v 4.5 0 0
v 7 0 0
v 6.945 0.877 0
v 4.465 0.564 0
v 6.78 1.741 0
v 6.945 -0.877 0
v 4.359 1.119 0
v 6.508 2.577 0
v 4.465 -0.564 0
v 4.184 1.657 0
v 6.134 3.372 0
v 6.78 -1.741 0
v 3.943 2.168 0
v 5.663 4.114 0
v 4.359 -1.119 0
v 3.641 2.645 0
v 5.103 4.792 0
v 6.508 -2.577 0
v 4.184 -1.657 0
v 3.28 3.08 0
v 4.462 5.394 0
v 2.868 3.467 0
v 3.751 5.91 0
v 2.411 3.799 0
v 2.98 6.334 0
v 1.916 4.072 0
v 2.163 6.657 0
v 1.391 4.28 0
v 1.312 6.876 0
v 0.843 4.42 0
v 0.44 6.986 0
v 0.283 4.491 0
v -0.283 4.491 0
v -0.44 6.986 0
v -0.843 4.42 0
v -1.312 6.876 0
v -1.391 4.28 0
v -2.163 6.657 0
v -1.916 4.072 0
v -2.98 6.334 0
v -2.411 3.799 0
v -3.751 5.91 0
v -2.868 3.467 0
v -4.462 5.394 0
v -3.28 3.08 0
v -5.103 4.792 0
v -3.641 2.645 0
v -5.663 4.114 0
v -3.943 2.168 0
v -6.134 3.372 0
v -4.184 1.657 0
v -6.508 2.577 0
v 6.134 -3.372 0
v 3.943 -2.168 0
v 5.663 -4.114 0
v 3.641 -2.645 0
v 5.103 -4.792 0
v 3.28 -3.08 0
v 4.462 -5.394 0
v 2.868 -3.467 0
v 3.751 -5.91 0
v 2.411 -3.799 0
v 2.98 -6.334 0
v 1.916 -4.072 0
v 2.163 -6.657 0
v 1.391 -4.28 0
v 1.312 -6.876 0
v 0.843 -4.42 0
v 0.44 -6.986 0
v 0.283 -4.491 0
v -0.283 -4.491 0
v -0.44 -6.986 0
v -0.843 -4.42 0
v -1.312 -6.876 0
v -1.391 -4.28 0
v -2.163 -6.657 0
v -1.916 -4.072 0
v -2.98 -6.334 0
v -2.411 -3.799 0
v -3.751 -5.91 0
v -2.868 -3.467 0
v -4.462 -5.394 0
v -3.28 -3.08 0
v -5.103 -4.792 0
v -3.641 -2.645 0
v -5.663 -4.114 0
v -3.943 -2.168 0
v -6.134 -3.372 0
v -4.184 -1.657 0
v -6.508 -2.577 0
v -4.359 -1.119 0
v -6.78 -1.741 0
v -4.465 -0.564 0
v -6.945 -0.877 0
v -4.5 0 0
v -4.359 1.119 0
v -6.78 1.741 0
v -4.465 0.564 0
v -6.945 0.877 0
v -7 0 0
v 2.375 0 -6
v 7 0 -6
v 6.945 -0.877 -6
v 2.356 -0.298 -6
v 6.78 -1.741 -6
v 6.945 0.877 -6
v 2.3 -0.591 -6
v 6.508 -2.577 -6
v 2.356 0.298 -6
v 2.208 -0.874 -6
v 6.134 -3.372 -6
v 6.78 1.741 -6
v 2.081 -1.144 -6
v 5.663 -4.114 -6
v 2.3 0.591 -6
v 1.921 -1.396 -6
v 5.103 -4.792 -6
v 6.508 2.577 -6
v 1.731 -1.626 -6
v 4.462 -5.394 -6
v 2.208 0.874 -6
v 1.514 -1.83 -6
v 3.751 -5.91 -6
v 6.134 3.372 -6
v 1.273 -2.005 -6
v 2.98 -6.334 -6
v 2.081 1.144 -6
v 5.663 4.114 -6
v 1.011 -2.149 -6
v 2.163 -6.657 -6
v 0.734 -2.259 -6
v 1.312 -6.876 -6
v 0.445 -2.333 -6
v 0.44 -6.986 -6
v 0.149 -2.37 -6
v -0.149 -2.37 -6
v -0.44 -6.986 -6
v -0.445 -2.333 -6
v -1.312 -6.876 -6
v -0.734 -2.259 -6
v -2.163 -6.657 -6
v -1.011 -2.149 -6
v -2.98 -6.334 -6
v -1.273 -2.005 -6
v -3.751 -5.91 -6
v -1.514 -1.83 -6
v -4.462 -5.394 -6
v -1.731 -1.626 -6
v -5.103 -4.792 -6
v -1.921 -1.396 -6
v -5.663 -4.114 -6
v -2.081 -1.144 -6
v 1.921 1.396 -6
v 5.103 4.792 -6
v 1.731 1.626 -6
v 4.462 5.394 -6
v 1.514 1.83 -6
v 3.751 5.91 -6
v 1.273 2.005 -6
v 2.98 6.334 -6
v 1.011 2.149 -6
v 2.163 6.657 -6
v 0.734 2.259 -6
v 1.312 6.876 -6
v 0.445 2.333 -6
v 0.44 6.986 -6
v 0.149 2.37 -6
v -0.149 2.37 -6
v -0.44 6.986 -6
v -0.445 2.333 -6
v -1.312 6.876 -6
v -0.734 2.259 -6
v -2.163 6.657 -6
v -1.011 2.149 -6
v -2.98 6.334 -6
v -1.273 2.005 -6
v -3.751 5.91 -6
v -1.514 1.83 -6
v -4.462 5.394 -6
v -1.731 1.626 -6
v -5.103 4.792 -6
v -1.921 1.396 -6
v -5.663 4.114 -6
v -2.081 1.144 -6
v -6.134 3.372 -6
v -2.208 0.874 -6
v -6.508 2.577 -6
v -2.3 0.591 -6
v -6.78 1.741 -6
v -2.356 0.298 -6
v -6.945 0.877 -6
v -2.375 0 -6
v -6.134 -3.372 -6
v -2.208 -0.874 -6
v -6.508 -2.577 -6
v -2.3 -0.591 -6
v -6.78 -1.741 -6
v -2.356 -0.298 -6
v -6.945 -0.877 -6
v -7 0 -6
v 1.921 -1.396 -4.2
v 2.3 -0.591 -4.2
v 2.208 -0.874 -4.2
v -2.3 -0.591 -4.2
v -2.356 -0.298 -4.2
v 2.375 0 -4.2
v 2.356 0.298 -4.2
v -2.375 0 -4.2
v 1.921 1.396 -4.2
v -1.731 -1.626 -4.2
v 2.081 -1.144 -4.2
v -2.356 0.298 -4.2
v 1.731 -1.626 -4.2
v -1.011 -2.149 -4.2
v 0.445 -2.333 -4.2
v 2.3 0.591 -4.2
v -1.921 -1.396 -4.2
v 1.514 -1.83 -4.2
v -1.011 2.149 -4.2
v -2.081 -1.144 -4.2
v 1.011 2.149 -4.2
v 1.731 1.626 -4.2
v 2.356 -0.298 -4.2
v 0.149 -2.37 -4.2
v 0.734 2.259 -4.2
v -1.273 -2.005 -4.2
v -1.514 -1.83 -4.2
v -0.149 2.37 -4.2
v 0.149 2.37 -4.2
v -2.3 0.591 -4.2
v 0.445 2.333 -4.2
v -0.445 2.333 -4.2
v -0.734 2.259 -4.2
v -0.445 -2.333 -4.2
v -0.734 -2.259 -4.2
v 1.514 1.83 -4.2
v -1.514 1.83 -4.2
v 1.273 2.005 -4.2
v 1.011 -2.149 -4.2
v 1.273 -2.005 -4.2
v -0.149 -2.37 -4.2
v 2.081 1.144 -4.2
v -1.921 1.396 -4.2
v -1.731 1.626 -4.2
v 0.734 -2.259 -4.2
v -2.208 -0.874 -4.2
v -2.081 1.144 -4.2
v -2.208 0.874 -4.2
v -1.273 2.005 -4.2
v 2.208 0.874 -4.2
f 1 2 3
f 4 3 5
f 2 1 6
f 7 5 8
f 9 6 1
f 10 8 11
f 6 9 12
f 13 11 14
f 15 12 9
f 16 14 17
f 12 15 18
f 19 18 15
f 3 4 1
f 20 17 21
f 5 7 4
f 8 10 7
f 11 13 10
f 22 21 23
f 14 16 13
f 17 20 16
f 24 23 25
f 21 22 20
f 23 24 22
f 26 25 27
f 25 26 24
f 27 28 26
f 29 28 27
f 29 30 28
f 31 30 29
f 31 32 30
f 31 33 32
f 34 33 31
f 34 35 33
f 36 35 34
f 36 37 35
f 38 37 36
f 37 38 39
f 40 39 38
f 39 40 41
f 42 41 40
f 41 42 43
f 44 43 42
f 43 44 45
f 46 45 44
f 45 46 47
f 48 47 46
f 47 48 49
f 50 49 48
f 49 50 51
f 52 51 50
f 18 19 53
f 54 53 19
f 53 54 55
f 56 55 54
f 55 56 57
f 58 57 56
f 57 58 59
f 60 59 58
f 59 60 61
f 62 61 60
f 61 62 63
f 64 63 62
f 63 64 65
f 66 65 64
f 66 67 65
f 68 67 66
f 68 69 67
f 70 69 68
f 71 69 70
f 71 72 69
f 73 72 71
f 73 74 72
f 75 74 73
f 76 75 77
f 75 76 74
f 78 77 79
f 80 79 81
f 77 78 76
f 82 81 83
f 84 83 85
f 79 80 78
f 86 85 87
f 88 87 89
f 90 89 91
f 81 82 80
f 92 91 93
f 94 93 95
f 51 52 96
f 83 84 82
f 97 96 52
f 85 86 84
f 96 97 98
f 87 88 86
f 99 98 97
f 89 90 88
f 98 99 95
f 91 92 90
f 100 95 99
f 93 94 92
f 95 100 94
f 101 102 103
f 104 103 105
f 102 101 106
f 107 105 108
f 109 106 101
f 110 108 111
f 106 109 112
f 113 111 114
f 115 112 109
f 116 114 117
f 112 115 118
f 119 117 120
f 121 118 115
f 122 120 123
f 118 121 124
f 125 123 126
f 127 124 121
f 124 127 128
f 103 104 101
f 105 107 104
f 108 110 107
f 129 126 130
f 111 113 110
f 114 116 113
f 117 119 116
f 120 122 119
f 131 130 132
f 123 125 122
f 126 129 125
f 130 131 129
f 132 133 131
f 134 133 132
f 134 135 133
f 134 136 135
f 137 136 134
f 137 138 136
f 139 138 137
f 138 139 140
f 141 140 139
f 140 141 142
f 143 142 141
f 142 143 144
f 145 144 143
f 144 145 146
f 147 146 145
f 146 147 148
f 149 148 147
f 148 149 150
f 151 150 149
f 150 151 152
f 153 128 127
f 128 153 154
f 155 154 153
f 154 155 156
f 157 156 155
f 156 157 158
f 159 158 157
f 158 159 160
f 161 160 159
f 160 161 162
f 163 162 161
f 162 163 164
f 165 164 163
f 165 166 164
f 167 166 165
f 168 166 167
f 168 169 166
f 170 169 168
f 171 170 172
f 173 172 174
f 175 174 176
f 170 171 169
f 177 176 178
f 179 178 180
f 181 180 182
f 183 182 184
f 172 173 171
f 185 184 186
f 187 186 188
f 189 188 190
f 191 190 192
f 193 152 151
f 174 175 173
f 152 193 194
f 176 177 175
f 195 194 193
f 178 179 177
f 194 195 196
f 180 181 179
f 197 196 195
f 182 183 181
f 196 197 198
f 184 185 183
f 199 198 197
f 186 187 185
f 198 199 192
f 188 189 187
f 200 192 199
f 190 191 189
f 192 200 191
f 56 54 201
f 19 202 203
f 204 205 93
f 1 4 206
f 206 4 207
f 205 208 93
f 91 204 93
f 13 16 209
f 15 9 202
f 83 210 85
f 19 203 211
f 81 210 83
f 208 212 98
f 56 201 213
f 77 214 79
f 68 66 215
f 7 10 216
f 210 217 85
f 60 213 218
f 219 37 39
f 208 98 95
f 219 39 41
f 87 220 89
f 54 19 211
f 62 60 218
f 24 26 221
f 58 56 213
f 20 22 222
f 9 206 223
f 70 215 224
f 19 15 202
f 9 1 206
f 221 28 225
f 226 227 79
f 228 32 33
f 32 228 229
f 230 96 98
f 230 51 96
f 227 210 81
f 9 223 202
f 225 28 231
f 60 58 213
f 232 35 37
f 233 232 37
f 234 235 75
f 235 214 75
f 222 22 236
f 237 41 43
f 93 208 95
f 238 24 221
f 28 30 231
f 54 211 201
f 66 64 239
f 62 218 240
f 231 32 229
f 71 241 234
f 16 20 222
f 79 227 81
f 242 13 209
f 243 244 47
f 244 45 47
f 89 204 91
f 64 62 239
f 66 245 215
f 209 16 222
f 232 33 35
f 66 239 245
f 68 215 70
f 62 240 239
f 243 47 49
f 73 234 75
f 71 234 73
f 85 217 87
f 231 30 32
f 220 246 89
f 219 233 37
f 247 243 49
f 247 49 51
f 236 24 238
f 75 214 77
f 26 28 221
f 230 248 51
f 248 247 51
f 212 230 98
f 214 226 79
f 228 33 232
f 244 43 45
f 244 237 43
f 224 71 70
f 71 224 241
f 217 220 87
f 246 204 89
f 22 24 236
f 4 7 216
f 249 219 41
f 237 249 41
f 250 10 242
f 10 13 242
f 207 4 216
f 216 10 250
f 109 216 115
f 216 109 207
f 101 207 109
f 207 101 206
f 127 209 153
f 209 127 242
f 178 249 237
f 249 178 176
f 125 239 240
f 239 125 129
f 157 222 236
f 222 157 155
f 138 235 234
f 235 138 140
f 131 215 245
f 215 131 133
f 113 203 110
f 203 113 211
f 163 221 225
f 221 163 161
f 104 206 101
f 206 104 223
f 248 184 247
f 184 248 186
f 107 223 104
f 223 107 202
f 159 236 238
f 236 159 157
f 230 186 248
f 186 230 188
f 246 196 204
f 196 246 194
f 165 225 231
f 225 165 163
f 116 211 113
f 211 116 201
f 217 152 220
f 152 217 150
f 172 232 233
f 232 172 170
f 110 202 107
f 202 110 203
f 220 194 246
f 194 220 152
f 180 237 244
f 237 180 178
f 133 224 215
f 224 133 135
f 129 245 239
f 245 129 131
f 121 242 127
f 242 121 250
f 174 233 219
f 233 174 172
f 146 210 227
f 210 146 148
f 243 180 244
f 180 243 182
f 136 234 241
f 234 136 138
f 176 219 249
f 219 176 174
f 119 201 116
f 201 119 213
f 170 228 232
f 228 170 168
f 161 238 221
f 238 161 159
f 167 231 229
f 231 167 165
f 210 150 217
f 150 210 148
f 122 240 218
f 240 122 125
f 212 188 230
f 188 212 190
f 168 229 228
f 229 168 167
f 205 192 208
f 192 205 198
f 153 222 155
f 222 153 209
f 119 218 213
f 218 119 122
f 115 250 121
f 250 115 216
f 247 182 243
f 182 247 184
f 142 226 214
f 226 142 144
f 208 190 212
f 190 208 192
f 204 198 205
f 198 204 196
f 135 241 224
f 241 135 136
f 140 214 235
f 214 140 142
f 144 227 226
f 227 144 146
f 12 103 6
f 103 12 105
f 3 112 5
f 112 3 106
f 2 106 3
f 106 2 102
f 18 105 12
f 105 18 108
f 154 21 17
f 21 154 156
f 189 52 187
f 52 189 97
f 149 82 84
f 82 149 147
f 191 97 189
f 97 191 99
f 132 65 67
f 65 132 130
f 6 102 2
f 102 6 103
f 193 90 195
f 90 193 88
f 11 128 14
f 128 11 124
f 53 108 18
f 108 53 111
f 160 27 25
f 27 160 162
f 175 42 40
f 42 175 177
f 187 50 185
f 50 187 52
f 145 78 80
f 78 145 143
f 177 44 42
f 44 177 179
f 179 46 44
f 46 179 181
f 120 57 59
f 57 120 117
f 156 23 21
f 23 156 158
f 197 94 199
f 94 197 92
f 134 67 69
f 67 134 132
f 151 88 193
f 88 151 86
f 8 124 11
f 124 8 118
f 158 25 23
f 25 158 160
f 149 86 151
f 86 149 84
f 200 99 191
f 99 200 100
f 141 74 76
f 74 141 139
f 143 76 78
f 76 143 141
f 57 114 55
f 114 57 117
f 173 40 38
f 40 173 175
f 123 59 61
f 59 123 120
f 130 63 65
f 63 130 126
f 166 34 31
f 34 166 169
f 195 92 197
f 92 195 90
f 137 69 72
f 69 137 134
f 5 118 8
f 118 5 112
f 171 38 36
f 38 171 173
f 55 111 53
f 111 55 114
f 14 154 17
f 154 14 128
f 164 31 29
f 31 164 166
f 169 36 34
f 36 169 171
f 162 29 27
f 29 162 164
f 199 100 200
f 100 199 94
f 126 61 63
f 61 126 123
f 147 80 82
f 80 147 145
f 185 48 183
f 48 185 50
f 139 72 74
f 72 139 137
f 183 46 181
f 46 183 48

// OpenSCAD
$fn = 50;


difference() {
	union() {
		translate(v = [0, 0, -6.0000000000]) {
			cylinder(h = 6, r = 7.0000000000);
		}
		cylinder(h = 0, r = 13.0000000000);
	}
	union() {
		translate(v = [0, 0, 0]) {
			rotate(a = [0, 0, 0]) {
				difference() {
					union() {
						#translate(v = [0, 0, -6.0000000000]) {
							cylinder(h = 6, r = 2.2500000000);
						}
						#translate(v = [0, 0, -4.2000000000]) {
							cylinder(h = 4.2000000000, r = 7.0000000000, r1 = 2.3750000000, r2 = 4.5000000000);
						}
						#translate(v = [0, 0, -6.0000000000]) {
							cylinder(h = 6, r = 2.3750000000);
						}
						#translate(v = [0, 0, -6.0000000000]) {
							cylinder(h = 6, r = 2.2500000000);
						}
					}
					union();
				}
			}
		}
	}
}
